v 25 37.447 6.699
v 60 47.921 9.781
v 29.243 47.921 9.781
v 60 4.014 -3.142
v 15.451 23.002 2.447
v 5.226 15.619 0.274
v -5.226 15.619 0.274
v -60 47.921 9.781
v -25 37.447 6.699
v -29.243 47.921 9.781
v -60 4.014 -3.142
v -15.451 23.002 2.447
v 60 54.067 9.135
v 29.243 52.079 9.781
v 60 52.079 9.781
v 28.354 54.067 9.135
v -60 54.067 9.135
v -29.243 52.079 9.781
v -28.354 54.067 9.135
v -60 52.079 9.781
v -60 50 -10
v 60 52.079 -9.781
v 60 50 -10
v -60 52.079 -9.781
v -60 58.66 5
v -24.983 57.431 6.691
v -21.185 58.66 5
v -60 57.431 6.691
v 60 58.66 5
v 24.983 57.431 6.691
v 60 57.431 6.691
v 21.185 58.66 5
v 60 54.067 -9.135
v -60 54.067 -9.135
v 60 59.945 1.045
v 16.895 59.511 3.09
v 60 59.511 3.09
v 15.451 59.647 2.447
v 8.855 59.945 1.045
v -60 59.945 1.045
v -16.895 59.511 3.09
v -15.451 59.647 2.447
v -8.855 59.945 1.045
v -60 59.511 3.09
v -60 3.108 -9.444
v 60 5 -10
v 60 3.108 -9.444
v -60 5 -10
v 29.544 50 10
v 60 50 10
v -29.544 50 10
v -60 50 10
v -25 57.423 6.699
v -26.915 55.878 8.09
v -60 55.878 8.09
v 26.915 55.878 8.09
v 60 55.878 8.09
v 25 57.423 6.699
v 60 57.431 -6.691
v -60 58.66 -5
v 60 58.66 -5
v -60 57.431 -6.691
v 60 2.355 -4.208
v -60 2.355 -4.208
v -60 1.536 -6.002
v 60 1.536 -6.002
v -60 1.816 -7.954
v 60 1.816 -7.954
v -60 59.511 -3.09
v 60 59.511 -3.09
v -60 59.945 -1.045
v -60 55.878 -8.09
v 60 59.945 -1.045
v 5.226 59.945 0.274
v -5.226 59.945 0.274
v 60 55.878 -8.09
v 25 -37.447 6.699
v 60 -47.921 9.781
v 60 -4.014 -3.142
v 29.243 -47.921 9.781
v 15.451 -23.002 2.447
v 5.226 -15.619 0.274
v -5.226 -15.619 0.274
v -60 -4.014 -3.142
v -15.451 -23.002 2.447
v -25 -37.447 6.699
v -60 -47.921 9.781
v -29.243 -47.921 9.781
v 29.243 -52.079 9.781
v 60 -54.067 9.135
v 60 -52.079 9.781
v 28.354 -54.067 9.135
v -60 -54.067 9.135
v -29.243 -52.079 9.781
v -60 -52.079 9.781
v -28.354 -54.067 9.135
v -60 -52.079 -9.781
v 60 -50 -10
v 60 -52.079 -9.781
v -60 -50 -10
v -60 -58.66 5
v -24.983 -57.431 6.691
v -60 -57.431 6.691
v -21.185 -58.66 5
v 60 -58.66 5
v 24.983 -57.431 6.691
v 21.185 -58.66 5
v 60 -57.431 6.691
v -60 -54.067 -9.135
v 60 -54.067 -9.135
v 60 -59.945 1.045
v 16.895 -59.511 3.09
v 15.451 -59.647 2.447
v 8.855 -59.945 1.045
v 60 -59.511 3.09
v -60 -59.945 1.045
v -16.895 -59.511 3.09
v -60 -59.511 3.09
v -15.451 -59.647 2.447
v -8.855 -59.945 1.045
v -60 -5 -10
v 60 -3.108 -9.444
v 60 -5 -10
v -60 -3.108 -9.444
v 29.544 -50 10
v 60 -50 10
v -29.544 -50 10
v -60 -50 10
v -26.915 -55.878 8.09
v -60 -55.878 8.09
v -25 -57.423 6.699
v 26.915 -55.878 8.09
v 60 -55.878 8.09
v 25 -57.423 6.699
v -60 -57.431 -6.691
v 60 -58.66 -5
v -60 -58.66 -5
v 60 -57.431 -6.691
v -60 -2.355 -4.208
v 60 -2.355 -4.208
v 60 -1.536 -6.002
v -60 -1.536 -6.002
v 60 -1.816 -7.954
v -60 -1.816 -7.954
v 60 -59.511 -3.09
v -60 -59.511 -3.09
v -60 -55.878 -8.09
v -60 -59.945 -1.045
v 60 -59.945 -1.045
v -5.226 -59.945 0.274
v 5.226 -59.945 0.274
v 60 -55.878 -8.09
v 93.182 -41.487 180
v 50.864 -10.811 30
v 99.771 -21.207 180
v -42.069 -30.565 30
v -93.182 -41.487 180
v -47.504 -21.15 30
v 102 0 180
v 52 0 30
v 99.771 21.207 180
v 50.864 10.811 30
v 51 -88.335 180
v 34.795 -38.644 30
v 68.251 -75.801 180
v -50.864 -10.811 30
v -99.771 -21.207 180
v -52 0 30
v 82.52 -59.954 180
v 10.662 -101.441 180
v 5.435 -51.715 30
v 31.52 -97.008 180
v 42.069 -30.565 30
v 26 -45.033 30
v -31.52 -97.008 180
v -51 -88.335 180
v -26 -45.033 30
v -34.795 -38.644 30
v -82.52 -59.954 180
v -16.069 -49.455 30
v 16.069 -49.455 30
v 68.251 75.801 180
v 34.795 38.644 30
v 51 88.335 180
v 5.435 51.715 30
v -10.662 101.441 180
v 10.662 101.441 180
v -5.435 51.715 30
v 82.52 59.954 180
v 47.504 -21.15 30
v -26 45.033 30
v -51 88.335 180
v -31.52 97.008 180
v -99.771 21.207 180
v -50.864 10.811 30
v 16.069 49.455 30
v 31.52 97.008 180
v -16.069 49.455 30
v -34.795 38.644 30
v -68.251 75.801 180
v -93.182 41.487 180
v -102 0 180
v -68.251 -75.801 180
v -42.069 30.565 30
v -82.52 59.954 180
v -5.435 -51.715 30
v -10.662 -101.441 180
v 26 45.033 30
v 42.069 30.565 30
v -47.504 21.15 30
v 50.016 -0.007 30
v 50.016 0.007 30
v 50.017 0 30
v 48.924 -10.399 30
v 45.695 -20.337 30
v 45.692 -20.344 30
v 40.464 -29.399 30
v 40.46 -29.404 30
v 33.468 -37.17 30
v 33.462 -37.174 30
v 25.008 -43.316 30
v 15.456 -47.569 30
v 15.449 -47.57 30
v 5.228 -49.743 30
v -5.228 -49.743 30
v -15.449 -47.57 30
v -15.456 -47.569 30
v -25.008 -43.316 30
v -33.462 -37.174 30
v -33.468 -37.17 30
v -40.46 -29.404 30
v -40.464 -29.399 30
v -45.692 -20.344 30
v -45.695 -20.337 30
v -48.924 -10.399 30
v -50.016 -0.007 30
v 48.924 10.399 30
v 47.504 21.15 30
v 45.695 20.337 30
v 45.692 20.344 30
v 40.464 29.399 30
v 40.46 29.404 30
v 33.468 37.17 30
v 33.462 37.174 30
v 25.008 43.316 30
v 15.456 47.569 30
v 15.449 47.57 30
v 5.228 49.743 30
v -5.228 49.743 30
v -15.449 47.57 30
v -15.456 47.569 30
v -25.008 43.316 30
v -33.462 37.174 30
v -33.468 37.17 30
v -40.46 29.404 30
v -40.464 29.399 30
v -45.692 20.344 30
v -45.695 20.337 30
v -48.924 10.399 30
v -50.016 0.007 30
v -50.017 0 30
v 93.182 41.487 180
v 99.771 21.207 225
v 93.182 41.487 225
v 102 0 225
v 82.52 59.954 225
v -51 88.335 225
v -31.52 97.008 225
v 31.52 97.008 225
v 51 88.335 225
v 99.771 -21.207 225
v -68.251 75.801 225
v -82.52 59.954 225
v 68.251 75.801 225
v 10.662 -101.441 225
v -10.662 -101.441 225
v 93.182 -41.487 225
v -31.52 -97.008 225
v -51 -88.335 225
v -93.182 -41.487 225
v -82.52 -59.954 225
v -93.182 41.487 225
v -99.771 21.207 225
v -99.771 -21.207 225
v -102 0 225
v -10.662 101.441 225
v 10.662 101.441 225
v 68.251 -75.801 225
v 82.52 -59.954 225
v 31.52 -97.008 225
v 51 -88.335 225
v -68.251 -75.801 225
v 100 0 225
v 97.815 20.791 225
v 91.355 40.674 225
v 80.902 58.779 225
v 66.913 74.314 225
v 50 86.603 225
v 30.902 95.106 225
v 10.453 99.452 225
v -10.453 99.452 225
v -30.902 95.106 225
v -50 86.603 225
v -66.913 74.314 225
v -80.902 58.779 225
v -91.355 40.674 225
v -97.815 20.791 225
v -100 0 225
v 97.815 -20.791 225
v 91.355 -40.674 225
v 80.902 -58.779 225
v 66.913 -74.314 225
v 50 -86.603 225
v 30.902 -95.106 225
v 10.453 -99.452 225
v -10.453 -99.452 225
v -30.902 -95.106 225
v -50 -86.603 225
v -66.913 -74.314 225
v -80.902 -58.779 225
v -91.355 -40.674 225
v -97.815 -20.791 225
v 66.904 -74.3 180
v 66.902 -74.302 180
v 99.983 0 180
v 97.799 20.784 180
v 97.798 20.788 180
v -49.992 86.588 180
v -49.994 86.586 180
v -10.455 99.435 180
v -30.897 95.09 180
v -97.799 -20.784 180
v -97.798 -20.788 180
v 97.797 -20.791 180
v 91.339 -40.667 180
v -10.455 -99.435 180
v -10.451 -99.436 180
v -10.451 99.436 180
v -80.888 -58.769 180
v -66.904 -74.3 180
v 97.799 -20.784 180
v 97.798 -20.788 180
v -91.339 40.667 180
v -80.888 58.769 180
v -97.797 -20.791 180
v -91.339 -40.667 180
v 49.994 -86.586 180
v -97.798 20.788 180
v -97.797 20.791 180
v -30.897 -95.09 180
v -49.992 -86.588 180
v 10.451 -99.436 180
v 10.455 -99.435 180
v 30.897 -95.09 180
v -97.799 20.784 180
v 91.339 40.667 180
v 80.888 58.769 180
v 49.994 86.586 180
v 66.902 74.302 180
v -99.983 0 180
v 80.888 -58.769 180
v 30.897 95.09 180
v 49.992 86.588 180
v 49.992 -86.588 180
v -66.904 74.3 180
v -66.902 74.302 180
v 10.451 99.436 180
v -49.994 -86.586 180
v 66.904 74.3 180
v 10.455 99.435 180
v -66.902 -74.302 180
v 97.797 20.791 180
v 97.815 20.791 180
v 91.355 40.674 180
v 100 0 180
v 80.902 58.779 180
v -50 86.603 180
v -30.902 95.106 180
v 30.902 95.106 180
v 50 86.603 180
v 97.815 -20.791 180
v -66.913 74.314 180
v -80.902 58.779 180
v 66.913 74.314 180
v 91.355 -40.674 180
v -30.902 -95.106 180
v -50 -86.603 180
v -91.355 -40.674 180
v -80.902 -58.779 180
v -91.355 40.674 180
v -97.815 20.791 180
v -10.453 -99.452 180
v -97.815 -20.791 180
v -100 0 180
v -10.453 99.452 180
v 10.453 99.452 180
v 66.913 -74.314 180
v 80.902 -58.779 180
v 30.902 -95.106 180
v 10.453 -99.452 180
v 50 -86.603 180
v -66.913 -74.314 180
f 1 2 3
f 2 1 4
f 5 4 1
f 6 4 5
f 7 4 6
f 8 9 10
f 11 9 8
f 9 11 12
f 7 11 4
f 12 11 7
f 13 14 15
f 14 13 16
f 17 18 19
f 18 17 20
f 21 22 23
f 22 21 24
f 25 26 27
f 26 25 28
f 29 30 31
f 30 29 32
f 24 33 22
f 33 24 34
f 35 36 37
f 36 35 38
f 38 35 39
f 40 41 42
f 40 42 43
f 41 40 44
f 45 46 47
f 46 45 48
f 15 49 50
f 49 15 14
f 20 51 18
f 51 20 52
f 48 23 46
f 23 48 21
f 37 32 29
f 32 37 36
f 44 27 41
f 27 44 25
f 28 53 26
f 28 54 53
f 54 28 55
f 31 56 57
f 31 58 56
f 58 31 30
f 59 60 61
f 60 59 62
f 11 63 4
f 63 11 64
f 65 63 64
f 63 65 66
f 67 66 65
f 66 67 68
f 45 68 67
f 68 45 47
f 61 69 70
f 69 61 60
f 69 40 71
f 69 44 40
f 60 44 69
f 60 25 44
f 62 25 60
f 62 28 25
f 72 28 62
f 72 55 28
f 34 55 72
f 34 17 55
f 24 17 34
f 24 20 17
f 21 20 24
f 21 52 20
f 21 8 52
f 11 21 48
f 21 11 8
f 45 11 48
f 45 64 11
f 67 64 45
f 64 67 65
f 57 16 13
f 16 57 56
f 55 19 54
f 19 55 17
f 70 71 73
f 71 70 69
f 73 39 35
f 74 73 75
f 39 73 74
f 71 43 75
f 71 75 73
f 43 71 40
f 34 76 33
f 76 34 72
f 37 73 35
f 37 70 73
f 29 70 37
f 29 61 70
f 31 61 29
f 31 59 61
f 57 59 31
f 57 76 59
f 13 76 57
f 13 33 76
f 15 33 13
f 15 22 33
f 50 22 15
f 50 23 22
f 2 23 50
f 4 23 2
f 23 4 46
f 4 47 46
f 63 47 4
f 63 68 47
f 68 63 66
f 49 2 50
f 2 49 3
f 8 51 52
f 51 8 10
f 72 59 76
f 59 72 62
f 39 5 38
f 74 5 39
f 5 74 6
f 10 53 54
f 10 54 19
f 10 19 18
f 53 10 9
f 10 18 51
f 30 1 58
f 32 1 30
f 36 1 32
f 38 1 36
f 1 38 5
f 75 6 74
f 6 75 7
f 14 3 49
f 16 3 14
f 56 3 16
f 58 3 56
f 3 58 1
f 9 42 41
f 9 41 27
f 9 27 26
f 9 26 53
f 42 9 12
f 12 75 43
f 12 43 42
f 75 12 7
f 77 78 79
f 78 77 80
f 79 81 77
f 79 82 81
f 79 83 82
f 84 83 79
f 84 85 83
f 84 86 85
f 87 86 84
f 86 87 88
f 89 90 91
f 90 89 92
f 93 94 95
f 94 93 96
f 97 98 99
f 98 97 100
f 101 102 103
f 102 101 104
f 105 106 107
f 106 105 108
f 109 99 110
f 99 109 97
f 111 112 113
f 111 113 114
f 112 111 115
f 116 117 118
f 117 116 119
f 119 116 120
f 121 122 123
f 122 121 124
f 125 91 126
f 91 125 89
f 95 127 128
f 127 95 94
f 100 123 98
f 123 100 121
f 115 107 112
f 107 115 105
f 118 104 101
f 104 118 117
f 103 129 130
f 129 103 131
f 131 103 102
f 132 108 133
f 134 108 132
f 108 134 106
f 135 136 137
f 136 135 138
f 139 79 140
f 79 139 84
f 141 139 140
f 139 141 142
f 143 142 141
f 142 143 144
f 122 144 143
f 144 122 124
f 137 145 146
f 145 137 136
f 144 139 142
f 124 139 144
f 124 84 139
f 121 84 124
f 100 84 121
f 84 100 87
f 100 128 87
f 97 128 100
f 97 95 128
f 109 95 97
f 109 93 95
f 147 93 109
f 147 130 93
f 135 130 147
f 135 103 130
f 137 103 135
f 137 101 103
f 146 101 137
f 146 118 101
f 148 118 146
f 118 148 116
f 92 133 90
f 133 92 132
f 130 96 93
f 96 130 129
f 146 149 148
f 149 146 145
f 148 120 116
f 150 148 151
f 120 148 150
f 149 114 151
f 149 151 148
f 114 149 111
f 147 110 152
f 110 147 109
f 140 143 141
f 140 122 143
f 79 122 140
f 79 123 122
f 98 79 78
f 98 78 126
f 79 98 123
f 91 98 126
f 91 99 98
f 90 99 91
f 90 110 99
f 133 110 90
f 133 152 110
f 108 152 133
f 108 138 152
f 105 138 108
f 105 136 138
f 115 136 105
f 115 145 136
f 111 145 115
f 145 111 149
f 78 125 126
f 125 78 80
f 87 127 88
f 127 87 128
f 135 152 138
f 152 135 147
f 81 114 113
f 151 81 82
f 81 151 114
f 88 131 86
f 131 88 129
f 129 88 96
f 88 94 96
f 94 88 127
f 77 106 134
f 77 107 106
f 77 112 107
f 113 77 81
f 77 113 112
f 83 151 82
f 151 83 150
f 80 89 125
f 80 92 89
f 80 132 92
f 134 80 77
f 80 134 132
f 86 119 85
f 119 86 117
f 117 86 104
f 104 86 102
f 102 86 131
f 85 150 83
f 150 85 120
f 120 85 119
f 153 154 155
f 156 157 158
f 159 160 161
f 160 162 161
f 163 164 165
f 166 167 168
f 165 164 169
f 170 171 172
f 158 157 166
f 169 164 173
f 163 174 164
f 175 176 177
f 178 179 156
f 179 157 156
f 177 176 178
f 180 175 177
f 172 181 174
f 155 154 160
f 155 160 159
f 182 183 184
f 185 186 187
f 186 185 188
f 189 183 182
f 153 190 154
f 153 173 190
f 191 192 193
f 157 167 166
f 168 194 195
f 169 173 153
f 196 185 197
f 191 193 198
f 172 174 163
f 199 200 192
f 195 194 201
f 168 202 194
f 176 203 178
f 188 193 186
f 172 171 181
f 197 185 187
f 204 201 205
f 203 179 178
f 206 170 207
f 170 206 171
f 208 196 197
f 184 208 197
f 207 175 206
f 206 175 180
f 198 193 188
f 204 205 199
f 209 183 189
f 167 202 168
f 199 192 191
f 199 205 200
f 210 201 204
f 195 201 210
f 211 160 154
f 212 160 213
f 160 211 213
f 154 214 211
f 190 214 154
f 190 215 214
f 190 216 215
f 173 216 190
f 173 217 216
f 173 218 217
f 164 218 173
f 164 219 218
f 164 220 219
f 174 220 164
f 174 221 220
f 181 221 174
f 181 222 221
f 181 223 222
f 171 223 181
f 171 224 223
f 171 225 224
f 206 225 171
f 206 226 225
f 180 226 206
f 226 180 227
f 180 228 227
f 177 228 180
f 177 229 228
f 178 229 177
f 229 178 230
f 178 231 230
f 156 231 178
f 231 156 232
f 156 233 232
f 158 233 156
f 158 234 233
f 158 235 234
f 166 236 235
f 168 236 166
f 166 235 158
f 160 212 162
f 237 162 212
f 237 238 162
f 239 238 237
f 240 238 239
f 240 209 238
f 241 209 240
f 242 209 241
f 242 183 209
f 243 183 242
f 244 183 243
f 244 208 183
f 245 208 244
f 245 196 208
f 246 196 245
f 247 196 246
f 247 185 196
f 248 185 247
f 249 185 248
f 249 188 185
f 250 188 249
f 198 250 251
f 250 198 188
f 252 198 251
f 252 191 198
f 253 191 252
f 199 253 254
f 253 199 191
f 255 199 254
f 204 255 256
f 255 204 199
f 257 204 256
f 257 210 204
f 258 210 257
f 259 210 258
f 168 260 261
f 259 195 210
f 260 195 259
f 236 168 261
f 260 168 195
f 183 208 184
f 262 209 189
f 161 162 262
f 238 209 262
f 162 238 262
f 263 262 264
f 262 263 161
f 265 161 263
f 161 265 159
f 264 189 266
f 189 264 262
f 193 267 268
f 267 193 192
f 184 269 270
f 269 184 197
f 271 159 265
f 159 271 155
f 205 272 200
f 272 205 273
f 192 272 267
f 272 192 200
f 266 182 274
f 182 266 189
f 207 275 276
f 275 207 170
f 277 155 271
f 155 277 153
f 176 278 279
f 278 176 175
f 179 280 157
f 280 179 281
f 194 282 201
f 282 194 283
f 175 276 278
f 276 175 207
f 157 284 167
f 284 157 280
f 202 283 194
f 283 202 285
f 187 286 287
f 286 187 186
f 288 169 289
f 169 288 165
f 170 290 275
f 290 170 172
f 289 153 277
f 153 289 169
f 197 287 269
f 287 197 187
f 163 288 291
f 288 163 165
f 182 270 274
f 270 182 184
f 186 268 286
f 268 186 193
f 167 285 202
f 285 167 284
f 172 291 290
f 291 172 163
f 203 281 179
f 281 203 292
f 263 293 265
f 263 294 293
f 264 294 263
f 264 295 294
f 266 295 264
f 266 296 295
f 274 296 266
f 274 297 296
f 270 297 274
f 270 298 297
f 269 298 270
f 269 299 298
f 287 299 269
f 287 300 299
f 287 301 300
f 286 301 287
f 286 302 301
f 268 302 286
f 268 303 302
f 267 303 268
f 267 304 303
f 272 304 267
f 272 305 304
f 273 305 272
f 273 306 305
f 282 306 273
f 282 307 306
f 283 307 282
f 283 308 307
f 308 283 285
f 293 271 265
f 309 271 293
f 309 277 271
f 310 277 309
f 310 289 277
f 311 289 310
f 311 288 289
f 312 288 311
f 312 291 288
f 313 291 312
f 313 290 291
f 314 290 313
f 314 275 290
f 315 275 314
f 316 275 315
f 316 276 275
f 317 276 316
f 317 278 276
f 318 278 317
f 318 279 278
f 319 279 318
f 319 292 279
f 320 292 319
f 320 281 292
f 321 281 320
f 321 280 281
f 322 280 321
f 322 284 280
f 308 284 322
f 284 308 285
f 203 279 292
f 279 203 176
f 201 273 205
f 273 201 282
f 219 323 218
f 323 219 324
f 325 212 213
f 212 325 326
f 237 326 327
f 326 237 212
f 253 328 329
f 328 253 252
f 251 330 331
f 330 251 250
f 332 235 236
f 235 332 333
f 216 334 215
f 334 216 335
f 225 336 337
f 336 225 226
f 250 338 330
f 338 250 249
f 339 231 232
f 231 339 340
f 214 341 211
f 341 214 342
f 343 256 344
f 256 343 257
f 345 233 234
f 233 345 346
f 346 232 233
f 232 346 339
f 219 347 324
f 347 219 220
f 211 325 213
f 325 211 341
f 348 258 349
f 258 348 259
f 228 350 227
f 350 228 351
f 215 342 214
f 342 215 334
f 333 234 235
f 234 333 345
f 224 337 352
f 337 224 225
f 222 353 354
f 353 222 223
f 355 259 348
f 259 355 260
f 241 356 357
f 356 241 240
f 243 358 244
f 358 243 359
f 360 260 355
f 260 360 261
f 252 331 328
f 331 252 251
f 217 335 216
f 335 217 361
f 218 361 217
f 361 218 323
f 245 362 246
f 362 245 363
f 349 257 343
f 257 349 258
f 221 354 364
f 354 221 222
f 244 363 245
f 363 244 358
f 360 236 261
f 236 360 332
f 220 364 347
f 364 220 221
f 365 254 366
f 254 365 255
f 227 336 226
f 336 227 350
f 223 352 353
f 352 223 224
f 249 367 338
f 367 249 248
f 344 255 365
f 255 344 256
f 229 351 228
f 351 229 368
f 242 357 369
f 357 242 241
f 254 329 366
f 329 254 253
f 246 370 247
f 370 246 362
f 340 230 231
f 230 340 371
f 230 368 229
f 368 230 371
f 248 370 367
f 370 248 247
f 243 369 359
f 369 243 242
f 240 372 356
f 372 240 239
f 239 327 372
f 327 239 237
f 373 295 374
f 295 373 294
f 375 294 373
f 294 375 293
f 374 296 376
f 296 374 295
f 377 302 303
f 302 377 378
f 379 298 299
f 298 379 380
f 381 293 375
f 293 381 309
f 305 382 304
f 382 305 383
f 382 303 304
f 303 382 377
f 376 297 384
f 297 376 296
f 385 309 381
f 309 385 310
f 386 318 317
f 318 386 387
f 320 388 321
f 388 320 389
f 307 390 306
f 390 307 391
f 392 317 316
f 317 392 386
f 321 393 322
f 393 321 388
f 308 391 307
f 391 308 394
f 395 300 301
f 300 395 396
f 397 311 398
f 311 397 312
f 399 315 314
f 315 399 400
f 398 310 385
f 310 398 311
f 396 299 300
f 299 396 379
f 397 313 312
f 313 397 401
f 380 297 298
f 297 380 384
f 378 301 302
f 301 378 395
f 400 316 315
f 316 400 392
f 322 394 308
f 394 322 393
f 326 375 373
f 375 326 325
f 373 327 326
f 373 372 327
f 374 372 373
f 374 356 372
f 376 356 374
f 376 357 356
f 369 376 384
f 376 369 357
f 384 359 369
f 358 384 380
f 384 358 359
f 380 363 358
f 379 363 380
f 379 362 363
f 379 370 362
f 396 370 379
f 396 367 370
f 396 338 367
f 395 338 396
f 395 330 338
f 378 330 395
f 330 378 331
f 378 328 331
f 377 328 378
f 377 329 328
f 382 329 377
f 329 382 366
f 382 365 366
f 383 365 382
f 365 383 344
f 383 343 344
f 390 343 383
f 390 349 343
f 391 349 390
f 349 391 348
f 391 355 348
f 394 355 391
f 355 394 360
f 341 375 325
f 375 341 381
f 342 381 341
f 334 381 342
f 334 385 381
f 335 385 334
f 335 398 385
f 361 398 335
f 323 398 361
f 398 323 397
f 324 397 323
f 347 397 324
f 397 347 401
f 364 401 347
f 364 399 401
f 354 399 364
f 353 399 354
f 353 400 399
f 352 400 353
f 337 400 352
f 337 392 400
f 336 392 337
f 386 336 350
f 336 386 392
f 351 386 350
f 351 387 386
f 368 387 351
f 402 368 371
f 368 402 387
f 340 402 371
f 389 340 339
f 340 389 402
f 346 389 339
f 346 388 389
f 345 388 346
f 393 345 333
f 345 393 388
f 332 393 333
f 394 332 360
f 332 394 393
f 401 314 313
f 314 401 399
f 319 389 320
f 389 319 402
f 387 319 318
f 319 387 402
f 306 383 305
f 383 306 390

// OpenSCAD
/* [Dimensions] */
rotation=0; //[0:90]
distance=80;
tipDia=7;
mainDia=20;
cutDia=100;
width=120;

/* [Hidden] */  
fudge=0.1;

color("red"){
translate([0,mainDia/2+distance/2,0]) rod();
mirror([0,1,0]) translate([0,mainDia/2+distance/2,0]) rod();
}

translate([0,0,30]) cone();

module cone(){
  difference(){
    union(){
      cylinder(d1=104,d2=204,h=150);
      translate([0,0,150]) cylinder(d=204,h=45);
    }
  translate([0,0,-fudge/2]) cylinder(d1=100,d2=200,h=150+fudge);
  translate([0,0,150]) cylinder(d=200,h=45+fudge);
  }
}

module rod(combined=true){
  
  if (distance==0)
    rotate([-rotation-90,0,0]) difference(){
        rotate([0,90,0]) cylinder(d=mainDia,h=200,center=true);
        translate([0,mainDia/2,0]) cylinder(d=cutDia,h=mainDia,center=true);
      }
  else if (combined)
    rotate([rotation,0,0])
    difference(){
      hull(){
        rotate([0,90,0]) cylinder(d=mainDia,h=width,center=true);
        translate([0,-(mainDia+distance)/2+5,-(mainDia-tipDia)/2]) 
          rotate([0,90,0]) cylinder(d=tipDia,h=width,center=true);
      }
       translate([0,0,50]) rotate([90,0,0]) cylinder(d=100,h=width,center=true);
    }
  else
  rotate([rotation,0,0]) 
    hull(){
      rotate([0,90,0]) cylinder(d=mainDia,h=200,center=true);
      translate([0,-(mainDia+distance)/2+5,(mainDia-tipDia)/2]) 
        rotate([0,90,0]) cylinder(d=tipDia,h=200,center=true);
    }
}
